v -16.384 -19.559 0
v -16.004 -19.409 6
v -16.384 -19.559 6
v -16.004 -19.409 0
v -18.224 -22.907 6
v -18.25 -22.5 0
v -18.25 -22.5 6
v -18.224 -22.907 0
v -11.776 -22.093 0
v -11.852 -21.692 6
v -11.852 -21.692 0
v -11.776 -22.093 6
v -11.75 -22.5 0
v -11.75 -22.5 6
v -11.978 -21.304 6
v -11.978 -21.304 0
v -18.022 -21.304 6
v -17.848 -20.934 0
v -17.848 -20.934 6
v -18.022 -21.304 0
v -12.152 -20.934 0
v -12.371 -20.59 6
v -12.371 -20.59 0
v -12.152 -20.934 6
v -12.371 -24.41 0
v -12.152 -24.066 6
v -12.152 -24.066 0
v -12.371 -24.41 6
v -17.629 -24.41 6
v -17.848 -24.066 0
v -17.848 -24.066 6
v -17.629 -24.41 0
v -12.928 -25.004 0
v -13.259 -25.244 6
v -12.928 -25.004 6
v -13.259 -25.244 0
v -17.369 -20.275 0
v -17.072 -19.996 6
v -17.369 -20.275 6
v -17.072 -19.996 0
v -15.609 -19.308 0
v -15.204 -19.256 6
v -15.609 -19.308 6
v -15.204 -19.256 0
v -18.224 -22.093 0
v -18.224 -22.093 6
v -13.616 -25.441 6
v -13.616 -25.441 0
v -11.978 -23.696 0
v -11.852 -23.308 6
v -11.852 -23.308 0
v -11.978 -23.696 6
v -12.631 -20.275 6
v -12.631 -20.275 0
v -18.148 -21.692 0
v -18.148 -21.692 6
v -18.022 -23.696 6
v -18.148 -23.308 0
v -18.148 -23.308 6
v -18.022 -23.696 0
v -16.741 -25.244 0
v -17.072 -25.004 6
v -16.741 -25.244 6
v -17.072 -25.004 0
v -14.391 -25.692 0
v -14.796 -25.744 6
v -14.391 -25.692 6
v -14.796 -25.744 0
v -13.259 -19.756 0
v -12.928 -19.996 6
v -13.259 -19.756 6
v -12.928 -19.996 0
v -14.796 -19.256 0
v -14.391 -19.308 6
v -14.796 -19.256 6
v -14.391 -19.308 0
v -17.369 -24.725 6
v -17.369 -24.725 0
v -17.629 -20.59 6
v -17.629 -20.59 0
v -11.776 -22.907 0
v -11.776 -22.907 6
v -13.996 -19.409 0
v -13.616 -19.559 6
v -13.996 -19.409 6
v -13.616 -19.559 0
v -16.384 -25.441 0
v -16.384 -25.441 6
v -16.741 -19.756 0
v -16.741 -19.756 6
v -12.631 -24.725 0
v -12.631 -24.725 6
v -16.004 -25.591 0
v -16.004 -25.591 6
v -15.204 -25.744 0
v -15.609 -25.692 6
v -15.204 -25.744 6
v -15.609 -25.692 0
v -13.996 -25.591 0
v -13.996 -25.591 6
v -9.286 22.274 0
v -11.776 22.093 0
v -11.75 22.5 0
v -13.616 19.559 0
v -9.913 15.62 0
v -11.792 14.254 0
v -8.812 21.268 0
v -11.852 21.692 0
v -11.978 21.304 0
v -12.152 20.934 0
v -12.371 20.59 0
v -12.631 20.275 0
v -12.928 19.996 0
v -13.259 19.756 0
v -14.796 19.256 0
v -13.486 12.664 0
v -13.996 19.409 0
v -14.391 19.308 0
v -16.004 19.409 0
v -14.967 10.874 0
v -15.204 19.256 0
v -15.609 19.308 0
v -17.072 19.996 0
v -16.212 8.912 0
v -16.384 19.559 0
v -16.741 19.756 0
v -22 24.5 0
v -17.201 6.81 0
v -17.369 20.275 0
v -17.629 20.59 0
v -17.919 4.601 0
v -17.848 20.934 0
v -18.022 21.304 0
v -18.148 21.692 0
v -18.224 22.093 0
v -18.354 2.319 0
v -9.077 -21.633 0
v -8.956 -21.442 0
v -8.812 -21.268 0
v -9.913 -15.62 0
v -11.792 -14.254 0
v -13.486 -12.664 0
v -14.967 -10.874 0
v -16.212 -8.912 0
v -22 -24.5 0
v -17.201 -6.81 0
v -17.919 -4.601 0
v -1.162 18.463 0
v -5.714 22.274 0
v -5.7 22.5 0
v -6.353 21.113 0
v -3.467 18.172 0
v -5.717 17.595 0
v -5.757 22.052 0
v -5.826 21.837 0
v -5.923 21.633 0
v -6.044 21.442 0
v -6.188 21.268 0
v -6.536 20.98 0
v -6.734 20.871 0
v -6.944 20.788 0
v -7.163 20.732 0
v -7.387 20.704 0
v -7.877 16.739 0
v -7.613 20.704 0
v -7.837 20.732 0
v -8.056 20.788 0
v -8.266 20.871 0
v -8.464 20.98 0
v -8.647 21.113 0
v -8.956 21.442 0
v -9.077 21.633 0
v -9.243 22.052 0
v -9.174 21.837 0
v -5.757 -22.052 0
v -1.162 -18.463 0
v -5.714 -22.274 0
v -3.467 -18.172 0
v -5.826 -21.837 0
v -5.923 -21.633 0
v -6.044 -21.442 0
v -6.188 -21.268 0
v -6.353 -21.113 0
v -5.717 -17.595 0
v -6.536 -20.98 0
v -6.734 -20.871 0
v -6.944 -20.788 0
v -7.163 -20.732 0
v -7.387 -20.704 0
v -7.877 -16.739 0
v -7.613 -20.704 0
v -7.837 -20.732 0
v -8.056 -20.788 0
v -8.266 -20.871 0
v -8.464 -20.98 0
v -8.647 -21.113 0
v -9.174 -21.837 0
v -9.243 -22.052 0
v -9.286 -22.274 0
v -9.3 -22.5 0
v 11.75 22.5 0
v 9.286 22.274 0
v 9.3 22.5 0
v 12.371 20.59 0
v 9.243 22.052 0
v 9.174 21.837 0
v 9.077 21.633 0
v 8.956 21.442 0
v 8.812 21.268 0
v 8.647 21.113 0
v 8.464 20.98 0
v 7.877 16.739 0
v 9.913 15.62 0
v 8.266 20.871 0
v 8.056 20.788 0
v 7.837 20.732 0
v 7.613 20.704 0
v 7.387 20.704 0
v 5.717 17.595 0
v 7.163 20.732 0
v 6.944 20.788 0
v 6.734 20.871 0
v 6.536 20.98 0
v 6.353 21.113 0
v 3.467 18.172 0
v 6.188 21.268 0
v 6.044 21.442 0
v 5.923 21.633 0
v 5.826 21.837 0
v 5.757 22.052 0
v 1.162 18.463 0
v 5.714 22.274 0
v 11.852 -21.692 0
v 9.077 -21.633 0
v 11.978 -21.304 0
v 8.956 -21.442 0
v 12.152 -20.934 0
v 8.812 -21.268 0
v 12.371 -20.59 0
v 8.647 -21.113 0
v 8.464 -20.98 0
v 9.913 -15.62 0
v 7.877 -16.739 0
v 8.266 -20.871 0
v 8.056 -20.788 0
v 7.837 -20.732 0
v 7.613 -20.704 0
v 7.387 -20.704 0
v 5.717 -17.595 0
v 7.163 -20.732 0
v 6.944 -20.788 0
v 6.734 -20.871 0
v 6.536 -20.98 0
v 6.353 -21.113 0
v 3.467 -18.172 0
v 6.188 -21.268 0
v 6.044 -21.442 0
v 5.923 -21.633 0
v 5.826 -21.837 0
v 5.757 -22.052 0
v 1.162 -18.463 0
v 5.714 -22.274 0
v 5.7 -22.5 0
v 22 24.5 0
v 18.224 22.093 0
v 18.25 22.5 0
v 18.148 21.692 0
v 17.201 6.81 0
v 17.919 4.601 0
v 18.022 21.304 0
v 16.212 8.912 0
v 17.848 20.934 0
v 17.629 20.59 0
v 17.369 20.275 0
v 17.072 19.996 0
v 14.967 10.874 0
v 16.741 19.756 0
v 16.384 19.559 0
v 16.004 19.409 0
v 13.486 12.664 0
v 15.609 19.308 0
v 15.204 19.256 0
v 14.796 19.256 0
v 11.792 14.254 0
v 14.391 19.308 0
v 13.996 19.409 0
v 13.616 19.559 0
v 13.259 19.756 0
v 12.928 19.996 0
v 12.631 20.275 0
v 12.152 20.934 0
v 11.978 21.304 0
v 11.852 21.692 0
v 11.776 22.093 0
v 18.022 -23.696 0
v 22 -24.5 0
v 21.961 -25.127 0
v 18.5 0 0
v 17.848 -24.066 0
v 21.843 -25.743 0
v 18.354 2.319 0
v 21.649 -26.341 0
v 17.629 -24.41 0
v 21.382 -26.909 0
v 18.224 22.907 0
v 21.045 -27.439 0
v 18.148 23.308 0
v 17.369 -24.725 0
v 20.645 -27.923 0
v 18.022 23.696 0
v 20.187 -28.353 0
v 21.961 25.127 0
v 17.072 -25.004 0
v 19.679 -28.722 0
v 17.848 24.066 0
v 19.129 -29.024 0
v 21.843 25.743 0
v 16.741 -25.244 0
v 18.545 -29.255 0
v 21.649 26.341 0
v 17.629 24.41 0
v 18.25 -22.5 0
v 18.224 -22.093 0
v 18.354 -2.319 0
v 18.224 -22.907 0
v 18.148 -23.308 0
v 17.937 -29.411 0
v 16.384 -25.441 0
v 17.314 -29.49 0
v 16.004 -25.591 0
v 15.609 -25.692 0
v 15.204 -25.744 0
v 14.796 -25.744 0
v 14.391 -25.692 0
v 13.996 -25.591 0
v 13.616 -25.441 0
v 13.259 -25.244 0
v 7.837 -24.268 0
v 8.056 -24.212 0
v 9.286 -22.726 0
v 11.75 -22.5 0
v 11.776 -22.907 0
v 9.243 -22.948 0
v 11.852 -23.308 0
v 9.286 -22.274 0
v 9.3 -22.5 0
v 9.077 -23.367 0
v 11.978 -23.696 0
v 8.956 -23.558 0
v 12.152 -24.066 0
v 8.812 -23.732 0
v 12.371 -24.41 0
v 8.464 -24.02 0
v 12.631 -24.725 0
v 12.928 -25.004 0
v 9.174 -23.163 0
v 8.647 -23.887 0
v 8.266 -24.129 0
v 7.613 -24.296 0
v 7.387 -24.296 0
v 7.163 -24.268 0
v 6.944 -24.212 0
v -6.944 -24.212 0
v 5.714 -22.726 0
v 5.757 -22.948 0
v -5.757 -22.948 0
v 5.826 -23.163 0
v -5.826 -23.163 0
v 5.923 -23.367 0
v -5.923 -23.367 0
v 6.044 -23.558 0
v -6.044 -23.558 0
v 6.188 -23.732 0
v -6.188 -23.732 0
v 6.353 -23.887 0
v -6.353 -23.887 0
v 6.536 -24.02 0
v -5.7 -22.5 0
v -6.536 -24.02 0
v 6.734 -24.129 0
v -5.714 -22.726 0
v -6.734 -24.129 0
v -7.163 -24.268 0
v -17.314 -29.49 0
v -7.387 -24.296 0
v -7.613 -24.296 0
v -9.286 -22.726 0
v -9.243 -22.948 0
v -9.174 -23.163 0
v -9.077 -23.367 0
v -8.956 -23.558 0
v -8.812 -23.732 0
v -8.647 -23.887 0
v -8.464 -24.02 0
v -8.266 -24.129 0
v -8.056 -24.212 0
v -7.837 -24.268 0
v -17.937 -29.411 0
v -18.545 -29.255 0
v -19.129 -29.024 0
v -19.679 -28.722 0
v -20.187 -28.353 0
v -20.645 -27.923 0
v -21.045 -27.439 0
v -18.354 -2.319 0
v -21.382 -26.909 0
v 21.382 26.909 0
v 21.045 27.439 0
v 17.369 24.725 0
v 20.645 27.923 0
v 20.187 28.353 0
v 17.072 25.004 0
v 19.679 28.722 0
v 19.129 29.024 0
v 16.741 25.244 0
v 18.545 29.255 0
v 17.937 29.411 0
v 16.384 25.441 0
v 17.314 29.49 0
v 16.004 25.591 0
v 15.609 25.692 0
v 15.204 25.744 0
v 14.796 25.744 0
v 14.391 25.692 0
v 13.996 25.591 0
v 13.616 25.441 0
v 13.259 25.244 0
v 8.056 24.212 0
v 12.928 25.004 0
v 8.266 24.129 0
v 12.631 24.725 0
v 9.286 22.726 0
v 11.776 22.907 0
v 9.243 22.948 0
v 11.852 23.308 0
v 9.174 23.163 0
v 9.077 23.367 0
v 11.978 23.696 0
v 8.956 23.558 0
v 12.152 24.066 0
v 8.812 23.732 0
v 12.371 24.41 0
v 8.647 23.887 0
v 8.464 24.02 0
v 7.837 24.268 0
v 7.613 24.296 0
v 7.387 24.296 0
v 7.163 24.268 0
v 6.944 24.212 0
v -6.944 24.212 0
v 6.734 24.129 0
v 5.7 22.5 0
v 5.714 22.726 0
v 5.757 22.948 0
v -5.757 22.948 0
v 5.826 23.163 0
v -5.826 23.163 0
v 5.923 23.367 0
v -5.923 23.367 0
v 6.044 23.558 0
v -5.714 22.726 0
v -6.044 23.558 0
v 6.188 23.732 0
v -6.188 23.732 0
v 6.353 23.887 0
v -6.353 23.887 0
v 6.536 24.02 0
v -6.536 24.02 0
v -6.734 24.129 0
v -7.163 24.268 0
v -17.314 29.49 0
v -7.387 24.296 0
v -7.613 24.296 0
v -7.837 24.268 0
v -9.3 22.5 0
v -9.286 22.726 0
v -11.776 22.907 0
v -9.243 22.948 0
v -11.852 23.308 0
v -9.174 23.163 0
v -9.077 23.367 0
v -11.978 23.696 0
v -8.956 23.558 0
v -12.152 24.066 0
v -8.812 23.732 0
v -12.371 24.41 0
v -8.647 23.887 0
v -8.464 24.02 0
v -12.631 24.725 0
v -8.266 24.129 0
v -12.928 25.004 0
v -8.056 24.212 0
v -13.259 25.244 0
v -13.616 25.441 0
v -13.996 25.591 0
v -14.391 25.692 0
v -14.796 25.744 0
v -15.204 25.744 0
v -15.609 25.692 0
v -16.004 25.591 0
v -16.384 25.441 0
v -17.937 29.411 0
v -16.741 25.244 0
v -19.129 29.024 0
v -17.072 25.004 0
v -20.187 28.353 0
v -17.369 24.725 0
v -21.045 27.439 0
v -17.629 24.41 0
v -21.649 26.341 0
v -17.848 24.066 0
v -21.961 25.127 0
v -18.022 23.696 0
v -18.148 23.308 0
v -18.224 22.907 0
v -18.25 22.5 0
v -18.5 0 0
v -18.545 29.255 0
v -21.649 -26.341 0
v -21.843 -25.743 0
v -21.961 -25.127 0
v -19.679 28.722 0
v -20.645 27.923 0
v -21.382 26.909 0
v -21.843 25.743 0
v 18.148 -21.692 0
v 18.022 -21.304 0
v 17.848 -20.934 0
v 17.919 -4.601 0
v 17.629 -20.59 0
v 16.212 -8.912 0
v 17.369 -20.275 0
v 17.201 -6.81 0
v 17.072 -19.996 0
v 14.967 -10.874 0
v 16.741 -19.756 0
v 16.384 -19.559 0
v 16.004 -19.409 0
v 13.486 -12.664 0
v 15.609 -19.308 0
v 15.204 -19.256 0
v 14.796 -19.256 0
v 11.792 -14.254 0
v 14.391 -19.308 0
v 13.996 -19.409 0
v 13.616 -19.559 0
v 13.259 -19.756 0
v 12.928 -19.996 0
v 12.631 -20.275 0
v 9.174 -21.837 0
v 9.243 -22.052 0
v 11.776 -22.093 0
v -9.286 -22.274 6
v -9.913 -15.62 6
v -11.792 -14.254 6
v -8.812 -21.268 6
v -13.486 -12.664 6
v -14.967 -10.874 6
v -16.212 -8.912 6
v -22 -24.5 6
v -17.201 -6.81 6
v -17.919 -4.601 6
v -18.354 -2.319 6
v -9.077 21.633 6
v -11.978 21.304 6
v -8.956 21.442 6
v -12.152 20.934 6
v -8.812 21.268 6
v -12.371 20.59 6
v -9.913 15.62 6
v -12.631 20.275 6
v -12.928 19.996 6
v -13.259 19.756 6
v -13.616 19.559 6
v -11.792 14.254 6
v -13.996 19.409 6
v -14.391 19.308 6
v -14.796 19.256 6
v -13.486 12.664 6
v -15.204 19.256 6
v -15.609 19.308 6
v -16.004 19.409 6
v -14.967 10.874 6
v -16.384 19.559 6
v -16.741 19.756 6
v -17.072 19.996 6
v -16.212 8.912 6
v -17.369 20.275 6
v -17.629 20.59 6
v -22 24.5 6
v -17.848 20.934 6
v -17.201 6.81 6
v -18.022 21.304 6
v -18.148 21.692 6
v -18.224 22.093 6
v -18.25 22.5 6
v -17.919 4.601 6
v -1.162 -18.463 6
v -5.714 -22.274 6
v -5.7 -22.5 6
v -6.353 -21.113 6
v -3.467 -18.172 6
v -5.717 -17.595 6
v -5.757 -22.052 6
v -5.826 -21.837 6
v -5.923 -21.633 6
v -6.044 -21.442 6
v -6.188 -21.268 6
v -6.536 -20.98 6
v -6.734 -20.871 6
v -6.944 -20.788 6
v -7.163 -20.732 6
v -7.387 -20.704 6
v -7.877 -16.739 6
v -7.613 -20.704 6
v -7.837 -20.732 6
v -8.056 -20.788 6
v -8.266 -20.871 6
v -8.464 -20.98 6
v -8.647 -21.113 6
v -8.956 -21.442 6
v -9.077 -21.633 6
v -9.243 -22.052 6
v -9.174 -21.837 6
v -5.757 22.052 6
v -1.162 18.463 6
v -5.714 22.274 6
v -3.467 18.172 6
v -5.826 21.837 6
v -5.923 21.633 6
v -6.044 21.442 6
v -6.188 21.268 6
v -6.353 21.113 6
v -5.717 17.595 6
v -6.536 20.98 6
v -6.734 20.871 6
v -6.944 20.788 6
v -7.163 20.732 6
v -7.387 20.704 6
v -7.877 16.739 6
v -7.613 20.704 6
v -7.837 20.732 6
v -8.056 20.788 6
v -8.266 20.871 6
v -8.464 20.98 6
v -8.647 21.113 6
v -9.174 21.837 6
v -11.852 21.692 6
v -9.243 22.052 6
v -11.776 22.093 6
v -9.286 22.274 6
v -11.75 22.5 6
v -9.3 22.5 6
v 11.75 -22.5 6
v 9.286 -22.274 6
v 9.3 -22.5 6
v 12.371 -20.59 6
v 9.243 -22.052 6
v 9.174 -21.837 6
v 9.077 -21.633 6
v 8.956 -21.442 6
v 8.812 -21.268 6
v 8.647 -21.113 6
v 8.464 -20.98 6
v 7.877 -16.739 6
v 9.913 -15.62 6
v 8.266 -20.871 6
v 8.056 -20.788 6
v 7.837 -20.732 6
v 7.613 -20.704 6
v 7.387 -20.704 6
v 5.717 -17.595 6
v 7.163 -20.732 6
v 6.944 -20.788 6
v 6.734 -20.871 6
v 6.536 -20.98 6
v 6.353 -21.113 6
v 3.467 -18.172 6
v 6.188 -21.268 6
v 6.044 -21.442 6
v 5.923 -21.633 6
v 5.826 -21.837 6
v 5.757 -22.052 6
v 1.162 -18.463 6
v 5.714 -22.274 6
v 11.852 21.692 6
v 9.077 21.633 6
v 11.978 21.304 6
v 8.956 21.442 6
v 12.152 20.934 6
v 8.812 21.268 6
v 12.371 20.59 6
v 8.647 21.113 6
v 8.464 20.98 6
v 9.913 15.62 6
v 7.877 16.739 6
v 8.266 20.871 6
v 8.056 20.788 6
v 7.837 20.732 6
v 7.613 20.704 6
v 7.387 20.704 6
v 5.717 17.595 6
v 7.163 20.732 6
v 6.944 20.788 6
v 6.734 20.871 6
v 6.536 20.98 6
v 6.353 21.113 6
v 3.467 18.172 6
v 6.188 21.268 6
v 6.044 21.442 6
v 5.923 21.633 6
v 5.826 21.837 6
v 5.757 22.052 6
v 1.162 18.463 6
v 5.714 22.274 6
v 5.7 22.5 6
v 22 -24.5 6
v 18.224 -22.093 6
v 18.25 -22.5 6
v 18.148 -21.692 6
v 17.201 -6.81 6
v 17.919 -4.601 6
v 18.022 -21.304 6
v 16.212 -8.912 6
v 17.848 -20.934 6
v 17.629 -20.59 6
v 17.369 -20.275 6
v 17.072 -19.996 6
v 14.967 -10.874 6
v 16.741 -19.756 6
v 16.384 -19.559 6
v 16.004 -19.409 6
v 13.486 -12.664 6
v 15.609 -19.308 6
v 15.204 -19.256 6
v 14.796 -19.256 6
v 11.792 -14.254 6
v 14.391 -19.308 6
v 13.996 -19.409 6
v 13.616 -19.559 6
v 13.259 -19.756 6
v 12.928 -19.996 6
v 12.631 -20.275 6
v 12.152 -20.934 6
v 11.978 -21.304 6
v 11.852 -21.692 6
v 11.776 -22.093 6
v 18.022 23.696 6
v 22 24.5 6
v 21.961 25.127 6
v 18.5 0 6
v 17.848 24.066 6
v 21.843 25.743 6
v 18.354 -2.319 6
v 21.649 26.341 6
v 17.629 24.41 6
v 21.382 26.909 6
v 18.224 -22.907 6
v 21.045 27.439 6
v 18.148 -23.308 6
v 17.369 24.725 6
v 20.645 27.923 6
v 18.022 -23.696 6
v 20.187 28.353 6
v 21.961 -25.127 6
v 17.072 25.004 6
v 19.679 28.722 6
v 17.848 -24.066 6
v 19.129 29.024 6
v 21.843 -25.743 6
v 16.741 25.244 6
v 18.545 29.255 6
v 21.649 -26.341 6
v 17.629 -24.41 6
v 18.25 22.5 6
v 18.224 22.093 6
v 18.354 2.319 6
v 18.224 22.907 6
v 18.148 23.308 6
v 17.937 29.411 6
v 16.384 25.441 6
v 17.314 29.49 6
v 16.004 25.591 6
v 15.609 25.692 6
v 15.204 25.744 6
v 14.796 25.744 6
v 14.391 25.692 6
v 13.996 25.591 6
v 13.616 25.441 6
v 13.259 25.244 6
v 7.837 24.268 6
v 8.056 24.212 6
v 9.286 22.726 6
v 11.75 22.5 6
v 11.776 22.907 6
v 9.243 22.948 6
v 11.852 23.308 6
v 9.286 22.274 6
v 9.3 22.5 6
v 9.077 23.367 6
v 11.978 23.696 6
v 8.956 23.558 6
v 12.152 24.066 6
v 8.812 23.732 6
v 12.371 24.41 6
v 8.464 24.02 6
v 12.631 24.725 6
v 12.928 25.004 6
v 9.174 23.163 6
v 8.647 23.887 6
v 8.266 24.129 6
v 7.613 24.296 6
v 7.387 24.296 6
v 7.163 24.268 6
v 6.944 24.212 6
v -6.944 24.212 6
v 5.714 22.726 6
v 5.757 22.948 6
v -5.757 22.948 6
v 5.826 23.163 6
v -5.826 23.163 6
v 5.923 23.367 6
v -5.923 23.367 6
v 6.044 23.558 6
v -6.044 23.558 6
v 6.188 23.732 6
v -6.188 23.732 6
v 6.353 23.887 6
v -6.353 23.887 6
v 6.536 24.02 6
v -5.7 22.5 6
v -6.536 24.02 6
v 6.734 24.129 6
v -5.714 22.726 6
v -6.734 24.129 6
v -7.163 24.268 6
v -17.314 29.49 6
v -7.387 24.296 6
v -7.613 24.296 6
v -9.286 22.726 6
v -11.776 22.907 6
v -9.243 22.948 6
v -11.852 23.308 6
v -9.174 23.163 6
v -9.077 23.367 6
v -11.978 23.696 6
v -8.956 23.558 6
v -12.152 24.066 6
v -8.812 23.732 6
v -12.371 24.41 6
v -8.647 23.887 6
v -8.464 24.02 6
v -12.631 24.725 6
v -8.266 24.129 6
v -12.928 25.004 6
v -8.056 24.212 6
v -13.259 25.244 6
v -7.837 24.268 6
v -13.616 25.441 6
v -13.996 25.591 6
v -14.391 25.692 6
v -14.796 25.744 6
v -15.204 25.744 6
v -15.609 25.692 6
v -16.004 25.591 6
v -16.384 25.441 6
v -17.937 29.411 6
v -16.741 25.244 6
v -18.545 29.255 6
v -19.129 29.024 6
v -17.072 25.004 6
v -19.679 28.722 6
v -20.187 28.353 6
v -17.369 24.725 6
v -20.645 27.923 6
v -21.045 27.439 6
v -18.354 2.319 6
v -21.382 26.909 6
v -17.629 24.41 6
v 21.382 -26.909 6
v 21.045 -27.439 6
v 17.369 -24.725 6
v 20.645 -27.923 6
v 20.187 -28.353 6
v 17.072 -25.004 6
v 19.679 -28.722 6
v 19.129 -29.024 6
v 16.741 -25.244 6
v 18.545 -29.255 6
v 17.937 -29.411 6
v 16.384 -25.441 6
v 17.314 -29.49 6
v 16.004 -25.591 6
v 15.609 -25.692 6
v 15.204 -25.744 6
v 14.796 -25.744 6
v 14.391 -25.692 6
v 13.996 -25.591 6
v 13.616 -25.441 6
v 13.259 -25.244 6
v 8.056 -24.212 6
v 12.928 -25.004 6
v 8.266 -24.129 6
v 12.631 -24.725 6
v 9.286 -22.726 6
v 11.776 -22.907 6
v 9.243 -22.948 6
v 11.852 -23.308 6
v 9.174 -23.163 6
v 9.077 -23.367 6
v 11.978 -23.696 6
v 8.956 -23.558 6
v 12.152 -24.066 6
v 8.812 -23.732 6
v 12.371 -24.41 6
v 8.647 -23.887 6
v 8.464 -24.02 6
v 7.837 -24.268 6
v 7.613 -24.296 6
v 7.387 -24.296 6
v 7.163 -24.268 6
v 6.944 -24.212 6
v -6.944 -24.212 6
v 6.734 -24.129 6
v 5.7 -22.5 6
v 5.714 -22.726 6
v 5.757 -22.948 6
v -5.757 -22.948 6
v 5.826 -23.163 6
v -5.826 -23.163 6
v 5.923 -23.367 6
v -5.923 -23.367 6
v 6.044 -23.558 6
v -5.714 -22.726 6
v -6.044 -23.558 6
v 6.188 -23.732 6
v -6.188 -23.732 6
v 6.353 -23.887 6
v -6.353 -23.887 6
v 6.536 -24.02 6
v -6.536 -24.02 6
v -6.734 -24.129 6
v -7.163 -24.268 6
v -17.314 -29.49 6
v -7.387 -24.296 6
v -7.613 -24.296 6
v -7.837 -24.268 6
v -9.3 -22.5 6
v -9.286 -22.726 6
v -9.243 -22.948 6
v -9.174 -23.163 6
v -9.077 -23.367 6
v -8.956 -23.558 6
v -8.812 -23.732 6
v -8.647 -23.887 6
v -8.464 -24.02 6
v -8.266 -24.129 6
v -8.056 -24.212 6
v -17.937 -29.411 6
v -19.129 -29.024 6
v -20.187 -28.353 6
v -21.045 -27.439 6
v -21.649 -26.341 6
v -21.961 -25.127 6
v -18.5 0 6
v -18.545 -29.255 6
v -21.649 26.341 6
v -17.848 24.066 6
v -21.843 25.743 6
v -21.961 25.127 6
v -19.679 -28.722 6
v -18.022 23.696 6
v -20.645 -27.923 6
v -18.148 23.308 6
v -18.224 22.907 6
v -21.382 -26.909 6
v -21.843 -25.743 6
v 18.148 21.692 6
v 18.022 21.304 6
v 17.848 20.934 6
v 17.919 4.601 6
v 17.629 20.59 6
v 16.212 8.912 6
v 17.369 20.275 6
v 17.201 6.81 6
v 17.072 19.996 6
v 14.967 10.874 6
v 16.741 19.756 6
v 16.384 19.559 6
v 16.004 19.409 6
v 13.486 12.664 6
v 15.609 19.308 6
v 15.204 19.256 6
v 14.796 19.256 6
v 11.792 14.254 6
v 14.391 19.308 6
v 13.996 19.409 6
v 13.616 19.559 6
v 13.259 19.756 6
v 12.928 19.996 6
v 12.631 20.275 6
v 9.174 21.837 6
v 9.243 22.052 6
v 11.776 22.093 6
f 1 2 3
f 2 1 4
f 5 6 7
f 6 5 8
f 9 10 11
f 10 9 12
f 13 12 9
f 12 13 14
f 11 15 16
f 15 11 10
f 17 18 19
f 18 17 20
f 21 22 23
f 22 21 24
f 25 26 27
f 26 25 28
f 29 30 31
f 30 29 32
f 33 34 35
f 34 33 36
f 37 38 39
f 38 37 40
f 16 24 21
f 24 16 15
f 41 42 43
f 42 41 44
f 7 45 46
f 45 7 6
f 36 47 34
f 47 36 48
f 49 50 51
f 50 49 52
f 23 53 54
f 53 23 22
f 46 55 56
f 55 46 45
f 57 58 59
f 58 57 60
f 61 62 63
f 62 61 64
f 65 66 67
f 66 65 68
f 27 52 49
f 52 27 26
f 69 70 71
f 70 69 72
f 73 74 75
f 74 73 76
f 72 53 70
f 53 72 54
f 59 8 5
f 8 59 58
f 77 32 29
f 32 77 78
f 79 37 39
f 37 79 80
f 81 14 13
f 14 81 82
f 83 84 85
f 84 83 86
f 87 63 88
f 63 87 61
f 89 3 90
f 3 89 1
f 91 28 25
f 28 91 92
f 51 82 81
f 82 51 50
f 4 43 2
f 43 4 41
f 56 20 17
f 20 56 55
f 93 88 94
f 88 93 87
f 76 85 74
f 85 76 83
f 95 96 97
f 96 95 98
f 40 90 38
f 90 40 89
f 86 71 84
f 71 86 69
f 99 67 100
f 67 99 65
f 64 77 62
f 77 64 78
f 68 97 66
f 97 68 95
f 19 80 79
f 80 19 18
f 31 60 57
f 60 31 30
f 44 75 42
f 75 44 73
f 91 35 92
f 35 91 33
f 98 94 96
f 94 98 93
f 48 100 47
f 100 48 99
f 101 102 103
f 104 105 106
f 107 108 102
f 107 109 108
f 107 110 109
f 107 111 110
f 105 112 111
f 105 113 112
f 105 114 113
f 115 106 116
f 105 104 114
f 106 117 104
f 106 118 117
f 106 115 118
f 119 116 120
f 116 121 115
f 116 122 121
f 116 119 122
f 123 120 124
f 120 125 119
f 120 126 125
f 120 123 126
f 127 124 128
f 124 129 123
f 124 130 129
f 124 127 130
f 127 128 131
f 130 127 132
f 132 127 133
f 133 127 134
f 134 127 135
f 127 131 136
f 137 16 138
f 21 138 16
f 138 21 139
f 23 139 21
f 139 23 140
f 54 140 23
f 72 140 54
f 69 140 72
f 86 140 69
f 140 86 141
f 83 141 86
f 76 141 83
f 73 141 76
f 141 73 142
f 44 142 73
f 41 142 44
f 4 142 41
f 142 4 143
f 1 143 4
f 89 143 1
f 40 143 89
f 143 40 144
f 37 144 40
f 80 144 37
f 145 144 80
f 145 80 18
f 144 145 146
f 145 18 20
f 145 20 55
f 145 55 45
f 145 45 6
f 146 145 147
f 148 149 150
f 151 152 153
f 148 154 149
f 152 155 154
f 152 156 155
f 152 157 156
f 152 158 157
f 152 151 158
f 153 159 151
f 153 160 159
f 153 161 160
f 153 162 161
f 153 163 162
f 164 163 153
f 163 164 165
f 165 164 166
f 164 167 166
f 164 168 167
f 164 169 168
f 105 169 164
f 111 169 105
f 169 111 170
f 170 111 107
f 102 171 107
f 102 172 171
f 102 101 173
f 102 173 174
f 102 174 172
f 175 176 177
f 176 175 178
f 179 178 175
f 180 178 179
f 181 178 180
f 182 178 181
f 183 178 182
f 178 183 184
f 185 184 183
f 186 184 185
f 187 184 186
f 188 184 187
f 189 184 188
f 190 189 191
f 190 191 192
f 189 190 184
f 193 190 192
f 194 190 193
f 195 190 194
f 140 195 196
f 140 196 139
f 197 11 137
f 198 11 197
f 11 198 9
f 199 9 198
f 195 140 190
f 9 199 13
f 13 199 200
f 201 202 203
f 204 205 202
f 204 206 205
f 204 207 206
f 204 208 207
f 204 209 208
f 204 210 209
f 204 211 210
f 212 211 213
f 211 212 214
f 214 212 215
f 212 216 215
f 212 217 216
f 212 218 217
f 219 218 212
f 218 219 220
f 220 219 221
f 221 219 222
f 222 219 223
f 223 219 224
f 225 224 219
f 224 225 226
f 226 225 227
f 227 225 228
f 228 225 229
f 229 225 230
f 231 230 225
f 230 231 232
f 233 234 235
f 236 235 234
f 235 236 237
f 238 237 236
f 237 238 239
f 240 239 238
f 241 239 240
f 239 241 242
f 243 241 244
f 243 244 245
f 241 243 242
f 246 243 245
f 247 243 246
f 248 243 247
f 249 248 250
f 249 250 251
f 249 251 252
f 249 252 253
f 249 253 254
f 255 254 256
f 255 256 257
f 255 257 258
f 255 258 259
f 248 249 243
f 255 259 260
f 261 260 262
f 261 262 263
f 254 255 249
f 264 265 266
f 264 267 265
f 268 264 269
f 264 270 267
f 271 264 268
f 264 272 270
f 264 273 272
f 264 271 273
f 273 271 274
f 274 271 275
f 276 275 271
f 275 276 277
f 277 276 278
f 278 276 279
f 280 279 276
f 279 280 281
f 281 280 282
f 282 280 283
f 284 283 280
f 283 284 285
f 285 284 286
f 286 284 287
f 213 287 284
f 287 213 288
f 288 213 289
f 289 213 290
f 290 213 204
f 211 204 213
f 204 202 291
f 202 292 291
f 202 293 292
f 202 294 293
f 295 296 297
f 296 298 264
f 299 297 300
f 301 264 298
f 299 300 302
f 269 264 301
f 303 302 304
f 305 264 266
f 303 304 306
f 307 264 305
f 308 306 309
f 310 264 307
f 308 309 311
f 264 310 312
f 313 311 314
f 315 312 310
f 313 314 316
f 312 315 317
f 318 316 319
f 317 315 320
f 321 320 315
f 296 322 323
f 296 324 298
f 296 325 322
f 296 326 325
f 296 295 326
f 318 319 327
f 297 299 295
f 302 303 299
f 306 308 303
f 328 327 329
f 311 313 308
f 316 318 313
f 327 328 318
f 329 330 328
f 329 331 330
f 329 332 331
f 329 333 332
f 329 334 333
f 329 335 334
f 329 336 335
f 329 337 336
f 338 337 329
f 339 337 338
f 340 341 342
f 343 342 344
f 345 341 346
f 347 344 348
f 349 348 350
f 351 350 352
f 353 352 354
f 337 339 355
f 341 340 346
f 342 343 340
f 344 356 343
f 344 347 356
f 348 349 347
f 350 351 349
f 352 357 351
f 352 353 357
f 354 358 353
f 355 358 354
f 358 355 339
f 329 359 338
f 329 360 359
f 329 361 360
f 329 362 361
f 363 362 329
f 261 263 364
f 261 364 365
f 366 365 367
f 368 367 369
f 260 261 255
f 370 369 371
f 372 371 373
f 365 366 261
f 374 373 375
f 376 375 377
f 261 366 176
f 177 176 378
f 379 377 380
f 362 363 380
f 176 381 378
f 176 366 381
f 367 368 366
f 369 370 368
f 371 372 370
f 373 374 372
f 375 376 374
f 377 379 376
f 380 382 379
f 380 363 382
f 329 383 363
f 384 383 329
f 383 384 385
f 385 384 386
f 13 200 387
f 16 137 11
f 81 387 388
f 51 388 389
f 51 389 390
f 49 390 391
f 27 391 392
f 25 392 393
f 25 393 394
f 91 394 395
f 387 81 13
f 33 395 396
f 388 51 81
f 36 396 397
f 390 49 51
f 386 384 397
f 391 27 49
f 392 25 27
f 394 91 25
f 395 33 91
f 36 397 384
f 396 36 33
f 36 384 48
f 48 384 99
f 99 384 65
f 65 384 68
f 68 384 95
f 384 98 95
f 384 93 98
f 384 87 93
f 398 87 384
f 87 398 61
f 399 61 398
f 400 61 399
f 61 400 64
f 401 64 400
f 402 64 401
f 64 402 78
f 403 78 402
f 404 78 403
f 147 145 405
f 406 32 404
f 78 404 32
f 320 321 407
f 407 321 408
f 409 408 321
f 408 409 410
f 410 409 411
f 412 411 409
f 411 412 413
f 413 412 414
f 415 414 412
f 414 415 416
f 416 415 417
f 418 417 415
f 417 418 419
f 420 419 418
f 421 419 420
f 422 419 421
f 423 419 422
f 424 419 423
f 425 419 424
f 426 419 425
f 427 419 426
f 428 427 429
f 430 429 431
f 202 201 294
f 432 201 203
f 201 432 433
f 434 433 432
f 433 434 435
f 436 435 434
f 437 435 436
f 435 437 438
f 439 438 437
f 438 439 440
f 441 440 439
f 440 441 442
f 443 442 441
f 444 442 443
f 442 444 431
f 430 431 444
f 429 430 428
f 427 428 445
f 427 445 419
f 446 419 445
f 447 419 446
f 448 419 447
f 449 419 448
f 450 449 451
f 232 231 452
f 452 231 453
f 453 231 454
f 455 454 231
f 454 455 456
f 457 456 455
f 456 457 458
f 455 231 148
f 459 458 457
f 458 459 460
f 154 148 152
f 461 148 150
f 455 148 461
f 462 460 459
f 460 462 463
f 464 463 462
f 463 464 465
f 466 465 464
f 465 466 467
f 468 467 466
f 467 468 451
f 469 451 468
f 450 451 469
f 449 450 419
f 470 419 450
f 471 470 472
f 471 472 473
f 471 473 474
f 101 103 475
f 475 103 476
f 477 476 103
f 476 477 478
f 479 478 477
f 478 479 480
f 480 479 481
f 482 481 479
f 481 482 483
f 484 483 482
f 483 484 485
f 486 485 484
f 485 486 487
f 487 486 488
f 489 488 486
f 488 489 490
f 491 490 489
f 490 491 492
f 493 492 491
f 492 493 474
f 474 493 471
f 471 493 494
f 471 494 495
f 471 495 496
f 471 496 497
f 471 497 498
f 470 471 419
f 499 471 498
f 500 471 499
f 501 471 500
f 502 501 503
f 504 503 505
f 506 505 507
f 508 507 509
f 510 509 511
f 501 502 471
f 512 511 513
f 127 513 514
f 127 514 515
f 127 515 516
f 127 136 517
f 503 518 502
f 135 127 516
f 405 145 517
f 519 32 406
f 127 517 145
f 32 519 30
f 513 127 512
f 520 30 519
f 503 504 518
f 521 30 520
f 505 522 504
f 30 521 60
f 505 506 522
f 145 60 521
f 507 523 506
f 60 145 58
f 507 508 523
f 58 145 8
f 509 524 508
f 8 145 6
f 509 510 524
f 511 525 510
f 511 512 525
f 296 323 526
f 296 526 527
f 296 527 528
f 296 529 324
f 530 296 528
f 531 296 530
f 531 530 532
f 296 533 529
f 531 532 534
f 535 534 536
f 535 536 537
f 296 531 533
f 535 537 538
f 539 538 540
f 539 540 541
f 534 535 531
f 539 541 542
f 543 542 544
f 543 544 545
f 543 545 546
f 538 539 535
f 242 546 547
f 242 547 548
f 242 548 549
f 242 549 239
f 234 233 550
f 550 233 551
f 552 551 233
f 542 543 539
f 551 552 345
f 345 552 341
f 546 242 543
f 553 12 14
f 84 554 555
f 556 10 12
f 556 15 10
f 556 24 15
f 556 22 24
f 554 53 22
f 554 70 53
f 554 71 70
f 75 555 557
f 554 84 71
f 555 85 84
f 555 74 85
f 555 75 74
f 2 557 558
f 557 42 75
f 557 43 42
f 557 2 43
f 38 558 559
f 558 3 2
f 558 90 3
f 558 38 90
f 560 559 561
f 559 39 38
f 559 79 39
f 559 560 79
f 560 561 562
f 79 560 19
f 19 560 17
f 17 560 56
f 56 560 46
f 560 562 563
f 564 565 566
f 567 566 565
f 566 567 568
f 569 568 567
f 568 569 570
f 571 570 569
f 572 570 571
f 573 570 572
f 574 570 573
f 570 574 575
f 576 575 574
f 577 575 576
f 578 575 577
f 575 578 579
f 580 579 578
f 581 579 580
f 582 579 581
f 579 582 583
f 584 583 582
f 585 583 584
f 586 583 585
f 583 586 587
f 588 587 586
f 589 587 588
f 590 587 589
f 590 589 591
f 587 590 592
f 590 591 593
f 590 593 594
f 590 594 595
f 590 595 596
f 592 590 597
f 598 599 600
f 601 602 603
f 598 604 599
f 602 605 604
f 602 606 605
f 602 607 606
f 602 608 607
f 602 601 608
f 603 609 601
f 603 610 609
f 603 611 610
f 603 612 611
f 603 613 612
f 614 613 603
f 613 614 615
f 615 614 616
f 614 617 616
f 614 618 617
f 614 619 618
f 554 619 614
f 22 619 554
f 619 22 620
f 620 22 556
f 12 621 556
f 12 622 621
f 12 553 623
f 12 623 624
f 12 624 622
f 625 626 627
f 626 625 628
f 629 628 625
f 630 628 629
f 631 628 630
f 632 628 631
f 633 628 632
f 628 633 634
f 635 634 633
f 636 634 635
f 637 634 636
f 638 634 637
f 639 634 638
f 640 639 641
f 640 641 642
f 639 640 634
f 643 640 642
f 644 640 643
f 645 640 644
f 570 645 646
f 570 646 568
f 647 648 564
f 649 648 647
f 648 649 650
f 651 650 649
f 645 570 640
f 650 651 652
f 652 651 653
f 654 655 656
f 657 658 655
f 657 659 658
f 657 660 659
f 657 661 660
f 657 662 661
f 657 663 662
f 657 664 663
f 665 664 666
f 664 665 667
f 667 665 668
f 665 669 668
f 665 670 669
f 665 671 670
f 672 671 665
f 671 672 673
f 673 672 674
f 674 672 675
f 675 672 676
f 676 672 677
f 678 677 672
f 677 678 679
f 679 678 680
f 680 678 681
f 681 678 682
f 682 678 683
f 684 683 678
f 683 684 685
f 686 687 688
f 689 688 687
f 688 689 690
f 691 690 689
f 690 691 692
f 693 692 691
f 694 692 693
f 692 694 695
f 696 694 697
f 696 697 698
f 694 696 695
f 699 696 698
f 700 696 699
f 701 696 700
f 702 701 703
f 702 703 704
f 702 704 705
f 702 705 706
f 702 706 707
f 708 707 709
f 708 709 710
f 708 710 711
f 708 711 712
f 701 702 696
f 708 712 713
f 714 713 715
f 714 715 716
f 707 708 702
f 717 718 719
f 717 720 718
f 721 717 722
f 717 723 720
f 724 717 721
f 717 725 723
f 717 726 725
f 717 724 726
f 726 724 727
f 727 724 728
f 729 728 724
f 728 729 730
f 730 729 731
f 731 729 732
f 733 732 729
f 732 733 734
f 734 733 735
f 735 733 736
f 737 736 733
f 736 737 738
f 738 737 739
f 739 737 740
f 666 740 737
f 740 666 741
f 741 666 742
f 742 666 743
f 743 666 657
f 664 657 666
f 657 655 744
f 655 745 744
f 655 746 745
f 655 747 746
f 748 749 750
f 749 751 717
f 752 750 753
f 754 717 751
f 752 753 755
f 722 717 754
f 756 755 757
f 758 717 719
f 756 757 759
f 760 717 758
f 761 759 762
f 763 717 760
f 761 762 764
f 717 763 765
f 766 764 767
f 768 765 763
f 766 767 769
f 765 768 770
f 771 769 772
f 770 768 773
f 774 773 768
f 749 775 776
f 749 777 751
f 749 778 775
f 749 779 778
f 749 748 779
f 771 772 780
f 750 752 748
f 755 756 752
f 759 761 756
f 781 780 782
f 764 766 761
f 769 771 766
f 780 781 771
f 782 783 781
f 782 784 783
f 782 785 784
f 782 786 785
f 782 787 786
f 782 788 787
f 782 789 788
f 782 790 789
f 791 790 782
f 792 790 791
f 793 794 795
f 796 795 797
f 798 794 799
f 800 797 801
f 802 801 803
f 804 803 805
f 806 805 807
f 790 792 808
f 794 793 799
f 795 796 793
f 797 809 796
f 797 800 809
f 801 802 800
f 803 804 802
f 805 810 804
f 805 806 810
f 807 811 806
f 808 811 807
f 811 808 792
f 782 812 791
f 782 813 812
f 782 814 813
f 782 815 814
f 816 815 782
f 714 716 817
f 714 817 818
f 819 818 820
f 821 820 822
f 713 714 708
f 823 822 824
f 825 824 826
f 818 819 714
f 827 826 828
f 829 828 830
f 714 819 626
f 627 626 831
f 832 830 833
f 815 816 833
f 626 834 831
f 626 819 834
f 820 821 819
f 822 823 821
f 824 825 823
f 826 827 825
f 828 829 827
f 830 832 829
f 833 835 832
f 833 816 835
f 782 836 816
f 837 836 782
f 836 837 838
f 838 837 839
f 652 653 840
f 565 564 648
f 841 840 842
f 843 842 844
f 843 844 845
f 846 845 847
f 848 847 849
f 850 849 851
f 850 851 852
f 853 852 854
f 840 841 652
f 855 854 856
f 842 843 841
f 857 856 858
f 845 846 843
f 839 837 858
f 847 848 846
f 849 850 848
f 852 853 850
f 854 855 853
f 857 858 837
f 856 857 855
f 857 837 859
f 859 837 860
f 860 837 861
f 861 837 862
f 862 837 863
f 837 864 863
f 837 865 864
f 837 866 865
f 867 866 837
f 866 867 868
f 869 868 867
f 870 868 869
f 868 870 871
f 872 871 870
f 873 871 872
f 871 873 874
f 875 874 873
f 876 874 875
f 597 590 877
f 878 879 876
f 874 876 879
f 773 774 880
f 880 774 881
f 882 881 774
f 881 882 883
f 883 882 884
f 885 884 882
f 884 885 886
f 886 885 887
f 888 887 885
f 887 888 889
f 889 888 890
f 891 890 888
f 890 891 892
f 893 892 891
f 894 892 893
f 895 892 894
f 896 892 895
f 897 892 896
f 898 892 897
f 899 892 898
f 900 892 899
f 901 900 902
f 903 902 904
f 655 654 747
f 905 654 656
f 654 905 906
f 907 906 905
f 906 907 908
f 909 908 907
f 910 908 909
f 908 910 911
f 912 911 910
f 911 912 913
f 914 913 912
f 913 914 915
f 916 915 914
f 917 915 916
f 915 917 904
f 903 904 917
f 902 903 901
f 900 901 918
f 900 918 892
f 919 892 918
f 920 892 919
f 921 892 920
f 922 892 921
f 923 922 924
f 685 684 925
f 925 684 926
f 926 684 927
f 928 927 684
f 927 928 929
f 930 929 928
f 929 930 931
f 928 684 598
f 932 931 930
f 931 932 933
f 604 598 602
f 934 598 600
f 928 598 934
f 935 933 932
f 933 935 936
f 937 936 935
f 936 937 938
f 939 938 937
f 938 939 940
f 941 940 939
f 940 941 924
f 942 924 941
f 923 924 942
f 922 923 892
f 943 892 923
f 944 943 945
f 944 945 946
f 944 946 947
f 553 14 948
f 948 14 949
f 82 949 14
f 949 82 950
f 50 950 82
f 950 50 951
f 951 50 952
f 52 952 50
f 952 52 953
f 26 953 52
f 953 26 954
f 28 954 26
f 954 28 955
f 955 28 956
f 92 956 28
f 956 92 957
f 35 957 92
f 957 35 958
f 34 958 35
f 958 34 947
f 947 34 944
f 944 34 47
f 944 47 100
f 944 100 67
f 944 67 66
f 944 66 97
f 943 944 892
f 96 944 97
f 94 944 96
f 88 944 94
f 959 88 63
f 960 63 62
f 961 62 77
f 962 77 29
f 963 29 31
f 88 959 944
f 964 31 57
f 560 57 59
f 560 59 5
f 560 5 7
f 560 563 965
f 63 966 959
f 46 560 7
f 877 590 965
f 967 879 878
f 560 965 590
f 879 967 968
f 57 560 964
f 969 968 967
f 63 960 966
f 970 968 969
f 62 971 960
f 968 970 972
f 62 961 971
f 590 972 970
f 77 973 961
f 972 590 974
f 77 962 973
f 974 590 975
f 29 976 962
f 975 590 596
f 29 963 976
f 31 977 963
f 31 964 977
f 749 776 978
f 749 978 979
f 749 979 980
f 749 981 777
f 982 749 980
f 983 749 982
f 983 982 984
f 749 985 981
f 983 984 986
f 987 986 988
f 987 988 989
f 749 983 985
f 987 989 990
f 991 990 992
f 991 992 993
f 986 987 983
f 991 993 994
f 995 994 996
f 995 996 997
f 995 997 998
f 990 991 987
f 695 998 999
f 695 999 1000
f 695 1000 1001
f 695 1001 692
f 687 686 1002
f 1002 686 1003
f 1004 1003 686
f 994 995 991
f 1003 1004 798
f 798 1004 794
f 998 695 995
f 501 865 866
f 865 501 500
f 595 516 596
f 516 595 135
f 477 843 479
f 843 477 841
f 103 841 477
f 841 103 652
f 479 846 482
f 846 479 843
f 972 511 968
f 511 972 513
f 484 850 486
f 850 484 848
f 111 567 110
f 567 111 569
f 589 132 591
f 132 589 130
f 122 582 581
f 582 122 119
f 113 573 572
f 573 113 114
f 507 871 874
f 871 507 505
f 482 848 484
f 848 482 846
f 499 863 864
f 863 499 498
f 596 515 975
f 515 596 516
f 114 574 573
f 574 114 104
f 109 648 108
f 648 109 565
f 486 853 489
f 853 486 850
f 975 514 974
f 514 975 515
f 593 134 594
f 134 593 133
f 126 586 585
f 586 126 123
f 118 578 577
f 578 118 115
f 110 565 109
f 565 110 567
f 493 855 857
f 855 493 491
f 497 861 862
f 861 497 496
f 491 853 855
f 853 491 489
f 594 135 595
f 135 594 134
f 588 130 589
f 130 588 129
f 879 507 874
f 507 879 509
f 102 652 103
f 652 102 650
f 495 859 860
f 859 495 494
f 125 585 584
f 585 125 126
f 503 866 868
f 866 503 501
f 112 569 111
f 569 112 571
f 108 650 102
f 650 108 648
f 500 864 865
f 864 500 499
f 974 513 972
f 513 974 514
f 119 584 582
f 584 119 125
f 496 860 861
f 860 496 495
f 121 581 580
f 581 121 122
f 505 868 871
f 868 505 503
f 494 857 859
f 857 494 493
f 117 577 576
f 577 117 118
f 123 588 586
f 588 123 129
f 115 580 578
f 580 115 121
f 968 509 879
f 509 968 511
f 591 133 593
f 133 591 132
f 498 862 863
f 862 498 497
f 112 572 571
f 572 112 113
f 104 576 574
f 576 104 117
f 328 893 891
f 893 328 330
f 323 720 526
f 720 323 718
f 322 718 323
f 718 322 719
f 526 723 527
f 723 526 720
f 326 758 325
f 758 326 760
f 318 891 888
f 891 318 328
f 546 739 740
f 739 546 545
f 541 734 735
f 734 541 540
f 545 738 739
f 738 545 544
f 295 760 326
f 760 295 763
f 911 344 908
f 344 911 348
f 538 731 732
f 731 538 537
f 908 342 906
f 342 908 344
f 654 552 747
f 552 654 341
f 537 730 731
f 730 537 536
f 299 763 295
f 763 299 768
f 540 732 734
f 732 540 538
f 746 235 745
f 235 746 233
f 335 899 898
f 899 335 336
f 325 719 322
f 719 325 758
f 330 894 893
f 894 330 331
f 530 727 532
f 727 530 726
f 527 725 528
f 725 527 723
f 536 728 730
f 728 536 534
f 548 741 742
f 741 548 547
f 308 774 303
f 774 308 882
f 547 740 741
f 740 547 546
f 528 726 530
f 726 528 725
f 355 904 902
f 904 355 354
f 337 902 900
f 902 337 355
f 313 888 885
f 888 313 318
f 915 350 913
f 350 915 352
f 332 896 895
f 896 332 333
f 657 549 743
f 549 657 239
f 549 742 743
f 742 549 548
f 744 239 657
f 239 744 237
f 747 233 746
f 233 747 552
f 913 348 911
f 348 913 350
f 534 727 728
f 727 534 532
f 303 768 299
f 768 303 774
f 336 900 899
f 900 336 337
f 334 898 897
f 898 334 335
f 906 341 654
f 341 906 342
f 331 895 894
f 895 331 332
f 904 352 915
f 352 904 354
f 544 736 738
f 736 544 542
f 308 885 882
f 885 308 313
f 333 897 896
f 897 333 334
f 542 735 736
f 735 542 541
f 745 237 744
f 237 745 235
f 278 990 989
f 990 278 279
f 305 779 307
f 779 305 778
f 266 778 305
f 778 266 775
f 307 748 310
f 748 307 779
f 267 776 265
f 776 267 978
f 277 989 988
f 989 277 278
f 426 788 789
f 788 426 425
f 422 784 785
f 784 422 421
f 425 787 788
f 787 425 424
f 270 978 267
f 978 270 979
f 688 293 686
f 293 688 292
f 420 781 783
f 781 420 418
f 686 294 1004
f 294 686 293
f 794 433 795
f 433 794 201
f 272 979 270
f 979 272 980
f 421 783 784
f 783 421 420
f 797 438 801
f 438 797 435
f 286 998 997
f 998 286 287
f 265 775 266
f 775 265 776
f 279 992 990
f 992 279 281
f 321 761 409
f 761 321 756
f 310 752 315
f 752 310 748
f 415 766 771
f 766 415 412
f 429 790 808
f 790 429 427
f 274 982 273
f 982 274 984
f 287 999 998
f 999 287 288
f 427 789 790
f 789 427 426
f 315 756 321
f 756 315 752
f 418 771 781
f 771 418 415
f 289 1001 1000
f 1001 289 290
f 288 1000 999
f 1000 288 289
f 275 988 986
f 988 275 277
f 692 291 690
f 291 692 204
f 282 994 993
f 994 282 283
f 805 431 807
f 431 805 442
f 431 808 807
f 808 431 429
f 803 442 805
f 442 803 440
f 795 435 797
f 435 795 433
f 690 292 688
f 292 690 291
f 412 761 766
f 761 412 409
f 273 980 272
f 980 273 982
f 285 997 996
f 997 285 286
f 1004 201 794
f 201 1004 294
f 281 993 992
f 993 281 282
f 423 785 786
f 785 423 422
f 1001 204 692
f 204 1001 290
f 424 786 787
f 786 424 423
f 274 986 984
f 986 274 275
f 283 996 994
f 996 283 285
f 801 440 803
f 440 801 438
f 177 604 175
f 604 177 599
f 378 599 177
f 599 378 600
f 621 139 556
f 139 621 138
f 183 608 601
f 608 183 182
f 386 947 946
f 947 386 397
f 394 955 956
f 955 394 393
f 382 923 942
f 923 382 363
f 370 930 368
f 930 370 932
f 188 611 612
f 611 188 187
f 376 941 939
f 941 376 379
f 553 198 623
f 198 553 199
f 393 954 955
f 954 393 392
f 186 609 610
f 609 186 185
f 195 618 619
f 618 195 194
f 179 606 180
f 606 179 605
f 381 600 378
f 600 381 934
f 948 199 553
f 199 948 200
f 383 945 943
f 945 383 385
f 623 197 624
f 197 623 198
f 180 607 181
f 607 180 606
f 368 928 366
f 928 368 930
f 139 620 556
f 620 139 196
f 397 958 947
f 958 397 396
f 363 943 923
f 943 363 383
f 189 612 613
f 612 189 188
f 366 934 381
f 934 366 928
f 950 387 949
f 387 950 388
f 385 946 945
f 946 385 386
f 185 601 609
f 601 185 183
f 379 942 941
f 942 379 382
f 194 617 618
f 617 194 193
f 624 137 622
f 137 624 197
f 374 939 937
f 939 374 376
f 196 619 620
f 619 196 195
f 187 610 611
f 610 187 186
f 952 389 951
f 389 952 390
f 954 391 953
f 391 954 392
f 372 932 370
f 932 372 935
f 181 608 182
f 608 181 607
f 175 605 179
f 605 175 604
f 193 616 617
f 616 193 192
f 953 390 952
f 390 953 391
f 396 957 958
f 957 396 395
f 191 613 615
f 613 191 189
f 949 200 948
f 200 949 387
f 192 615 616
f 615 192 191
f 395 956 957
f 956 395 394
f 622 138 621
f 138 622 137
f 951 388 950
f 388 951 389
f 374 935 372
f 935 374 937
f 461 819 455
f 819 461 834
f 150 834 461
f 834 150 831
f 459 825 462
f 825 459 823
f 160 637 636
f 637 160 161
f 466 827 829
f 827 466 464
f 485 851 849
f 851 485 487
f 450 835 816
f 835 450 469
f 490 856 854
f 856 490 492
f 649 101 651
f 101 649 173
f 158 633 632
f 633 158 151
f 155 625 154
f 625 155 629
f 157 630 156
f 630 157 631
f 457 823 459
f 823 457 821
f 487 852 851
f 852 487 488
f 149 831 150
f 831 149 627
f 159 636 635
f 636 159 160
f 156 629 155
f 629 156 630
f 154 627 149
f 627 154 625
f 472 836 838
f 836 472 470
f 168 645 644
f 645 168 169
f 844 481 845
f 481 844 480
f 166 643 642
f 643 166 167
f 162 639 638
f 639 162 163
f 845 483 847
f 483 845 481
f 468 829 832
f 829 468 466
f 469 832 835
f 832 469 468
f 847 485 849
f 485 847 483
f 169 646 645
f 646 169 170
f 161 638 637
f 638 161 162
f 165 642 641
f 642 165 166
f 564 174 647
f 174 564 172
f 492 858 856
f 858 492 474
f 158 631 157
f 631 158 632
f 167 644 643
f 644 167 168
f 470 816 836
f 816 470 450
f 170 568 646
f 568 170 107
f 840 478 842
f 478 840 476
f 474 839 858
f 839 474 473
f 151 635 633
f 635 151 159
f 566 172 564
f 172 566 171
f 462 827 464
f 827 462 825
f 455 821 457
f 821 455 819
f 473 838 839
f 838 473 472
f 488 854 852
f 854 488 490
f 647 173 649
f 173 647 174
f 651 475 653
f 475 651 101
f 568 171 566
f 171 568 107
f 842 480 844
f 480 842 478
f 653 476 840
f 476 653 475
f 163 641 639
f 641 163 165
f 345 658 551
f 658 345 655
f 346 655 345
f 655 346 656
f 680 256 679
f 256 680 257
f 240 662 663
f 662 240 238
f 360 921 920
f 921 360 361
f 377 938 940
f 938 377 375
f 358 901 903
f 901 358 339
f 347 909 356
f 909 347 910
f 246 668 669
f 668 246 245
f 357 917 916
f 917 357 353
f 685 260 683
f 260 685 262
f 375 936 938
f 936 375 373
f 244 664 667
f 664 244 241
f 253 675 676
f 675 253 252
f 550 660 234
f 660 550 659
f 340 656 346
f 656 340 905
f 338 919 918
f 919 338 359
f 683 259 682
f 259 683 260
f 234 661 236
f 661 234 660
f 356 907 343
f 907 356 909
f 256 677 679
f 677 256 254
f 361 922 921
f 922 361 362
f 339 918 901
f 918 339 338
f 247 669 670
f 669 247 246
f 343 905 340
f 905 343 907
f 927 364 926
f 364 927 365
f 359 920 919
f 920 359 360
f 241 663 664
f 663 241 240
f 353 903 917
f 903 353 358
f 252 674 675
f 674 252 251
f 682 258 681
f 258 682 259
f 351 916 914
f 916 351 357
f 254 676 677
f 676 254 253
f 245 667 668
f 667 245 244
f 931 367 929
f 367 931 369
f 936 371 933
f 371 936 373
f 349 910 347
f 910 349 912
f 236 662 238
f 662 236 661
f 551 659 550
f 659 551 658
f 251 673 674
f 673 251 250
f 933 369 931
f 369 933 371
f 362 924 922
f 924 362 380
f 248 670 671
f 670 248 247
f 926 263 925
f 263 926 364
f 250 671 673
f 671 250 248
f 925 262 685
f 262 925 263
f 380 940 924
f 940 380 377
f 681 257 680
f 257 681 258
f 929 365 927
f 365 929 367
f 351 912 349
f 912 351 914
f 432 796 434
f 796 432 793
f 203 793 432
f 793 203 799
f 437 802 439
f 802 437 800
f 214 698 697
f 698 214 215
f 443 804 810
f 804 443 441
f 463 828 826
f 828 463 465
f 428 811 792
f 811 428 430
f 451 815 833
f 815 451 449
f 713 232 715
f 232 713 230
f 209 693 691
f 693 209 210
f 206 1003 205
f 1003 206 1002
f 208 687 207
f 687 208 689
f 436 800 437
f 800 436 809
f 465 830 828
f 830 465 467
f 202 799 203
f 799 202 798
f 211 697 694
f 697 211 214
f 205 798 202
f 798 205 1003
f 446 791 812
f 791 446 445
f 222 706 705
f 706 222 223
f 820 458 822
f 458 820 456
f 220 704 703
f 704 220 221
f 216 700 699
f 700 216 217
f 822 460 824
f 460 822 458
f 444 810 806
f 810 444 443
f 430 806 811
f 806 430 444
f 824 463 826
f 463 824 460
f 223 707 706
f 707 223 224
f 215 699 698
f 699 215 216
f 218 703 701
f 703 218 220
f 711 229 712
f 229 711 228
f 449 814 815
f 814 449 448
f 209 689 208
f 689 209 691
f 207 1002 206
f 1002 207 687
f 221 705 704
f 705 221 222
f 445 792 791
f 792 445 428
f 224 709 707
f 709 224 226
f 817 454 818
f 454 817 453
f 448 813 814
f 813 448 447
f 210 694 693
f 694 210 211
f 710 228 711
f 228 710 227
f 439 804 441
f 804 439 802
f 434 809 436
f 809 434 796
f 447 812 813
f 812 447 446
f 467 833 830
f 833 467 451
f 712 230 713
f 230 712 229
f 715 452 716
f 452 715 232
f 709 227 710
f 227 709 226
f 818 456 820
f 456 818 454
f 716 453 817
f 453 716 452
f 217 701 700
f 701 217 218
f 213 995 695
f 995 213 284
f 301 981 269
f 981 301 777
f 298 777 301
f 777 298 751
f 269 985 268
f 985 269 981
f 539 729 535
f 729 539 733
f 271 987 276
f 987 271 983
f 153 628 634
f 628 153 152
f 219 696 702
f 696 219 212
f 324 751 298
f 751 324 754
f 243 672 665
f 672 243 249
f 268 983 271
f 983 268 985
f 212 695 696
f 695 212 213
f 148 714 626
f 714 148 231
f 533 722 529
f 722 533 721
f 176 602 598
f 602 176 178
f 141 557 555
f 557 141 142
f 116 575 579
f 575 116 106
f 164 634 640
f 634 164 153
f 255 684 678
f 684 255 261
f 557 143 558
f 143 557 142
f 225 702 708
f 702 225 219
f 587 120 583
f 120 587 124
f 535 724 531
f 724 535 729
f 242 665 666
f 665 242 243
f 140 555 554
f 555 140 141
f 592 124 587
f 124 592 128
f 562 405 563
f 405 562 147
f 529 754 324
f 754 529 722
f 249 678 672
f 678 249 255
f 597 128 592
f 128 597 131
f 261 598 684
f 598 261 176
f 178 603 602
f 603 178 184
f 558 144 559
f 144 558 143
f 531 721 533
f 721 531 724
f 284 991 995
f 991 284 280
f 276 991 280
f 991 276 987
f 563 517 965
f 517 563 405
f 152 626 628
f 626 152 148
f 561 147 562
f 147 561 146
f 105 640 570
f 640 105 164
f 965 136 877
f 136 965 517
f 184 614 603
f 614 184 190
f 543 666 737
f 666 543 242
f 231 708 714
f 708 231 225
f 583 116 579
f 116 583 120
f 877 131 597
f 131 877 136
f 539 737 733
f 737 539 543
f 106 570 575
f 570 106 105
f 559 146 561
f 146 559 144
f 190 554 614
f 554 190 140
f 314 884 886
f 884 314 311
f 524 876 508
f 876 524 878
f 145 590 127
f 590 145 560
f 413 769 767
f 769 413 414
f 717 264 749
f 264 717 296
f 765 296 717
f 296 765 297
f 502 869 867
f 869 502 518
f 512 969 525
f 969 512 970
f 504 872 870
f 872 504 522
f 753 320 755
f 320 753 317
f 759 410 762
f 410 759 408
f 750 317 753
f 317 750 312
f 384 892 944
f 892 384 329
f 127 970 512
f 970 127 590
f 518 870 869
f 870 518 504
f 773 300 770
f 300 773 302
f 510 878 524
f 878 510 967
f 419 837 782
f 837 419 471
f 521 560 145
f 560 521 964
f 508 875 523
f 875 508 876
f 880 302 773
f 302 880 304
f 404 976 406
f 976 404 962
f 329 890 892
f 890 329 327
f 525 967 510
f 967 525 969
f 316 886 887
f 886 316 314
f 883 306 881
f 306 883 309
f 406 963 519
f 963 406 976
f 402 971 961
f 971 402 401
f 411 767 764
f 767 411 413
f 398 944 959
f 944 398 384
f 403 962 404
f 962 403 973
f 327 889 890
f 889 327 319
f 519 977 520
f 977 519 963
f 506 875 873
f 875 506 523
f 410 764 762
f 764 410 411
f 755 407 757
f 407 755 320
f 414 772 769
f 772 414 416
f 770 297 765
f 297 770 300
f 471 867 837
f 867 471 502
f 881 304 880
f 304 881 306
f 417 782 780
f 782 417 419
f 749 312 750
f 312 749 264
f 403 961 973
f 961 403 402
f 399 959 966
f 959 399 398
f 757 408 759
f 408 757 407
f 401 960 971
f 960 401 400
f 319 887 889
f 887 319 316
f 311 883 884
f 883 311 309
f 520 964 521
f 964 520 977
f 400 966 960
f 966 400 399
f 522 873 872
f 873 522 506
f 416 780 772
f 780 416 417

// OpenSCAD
$fn = 50;

difference() {
	union() {
		hull() {
			translate(v = [-17.0, 24.5, 0]) {
				cylinder(h = 6, r = 5);
			}
			translate(v = [17.0, 24.5, 0]) {
				cylinder(h = 6, r = 5);
			}
			translate(v = [-17.0, -24.5, 0]) {
				cylinder(h = 6, r = 5);
			}
			translate(v = [17.0, -24.5, 0]) {
				cylinder(h = 6, r = 5);
			}
		}
	}
	union() {
		translate(v = [-15.0, -22.5, 0]) {
			cylinder(h = 6, r = 3.25);
		}
		translate(v = [-15.0, 22.5, 0]) {
			cylinder(h = 6, r = 3.25);
		}
		translate(v = [15.0, -22.5, 0]) {
			cylinder(h = 6, r = 3.25);
		}
		translate(v = [15.0, 22.5, 0]) {
			cylinder(h = 6, r = 3.25);
		}
		translate(v = [-7.5, -22.5, 0]) {
			cylinder(h = 6, r = 1.8);
		}
		translate(v = [-7.5, 22.5, 0]) {
			cylinder(h = 6, r = 1.8);
		}
		translate(v = [7.5, -22.5, 0]) {
			cylinder(h = 6, r = 1.8);
		}
		translate(v = [7.5, 22.5, 0]) {
			cylinder(h = 6, r = 1.8);
		}
		cylinder(h = 6, r = 18.5);
	}
}
